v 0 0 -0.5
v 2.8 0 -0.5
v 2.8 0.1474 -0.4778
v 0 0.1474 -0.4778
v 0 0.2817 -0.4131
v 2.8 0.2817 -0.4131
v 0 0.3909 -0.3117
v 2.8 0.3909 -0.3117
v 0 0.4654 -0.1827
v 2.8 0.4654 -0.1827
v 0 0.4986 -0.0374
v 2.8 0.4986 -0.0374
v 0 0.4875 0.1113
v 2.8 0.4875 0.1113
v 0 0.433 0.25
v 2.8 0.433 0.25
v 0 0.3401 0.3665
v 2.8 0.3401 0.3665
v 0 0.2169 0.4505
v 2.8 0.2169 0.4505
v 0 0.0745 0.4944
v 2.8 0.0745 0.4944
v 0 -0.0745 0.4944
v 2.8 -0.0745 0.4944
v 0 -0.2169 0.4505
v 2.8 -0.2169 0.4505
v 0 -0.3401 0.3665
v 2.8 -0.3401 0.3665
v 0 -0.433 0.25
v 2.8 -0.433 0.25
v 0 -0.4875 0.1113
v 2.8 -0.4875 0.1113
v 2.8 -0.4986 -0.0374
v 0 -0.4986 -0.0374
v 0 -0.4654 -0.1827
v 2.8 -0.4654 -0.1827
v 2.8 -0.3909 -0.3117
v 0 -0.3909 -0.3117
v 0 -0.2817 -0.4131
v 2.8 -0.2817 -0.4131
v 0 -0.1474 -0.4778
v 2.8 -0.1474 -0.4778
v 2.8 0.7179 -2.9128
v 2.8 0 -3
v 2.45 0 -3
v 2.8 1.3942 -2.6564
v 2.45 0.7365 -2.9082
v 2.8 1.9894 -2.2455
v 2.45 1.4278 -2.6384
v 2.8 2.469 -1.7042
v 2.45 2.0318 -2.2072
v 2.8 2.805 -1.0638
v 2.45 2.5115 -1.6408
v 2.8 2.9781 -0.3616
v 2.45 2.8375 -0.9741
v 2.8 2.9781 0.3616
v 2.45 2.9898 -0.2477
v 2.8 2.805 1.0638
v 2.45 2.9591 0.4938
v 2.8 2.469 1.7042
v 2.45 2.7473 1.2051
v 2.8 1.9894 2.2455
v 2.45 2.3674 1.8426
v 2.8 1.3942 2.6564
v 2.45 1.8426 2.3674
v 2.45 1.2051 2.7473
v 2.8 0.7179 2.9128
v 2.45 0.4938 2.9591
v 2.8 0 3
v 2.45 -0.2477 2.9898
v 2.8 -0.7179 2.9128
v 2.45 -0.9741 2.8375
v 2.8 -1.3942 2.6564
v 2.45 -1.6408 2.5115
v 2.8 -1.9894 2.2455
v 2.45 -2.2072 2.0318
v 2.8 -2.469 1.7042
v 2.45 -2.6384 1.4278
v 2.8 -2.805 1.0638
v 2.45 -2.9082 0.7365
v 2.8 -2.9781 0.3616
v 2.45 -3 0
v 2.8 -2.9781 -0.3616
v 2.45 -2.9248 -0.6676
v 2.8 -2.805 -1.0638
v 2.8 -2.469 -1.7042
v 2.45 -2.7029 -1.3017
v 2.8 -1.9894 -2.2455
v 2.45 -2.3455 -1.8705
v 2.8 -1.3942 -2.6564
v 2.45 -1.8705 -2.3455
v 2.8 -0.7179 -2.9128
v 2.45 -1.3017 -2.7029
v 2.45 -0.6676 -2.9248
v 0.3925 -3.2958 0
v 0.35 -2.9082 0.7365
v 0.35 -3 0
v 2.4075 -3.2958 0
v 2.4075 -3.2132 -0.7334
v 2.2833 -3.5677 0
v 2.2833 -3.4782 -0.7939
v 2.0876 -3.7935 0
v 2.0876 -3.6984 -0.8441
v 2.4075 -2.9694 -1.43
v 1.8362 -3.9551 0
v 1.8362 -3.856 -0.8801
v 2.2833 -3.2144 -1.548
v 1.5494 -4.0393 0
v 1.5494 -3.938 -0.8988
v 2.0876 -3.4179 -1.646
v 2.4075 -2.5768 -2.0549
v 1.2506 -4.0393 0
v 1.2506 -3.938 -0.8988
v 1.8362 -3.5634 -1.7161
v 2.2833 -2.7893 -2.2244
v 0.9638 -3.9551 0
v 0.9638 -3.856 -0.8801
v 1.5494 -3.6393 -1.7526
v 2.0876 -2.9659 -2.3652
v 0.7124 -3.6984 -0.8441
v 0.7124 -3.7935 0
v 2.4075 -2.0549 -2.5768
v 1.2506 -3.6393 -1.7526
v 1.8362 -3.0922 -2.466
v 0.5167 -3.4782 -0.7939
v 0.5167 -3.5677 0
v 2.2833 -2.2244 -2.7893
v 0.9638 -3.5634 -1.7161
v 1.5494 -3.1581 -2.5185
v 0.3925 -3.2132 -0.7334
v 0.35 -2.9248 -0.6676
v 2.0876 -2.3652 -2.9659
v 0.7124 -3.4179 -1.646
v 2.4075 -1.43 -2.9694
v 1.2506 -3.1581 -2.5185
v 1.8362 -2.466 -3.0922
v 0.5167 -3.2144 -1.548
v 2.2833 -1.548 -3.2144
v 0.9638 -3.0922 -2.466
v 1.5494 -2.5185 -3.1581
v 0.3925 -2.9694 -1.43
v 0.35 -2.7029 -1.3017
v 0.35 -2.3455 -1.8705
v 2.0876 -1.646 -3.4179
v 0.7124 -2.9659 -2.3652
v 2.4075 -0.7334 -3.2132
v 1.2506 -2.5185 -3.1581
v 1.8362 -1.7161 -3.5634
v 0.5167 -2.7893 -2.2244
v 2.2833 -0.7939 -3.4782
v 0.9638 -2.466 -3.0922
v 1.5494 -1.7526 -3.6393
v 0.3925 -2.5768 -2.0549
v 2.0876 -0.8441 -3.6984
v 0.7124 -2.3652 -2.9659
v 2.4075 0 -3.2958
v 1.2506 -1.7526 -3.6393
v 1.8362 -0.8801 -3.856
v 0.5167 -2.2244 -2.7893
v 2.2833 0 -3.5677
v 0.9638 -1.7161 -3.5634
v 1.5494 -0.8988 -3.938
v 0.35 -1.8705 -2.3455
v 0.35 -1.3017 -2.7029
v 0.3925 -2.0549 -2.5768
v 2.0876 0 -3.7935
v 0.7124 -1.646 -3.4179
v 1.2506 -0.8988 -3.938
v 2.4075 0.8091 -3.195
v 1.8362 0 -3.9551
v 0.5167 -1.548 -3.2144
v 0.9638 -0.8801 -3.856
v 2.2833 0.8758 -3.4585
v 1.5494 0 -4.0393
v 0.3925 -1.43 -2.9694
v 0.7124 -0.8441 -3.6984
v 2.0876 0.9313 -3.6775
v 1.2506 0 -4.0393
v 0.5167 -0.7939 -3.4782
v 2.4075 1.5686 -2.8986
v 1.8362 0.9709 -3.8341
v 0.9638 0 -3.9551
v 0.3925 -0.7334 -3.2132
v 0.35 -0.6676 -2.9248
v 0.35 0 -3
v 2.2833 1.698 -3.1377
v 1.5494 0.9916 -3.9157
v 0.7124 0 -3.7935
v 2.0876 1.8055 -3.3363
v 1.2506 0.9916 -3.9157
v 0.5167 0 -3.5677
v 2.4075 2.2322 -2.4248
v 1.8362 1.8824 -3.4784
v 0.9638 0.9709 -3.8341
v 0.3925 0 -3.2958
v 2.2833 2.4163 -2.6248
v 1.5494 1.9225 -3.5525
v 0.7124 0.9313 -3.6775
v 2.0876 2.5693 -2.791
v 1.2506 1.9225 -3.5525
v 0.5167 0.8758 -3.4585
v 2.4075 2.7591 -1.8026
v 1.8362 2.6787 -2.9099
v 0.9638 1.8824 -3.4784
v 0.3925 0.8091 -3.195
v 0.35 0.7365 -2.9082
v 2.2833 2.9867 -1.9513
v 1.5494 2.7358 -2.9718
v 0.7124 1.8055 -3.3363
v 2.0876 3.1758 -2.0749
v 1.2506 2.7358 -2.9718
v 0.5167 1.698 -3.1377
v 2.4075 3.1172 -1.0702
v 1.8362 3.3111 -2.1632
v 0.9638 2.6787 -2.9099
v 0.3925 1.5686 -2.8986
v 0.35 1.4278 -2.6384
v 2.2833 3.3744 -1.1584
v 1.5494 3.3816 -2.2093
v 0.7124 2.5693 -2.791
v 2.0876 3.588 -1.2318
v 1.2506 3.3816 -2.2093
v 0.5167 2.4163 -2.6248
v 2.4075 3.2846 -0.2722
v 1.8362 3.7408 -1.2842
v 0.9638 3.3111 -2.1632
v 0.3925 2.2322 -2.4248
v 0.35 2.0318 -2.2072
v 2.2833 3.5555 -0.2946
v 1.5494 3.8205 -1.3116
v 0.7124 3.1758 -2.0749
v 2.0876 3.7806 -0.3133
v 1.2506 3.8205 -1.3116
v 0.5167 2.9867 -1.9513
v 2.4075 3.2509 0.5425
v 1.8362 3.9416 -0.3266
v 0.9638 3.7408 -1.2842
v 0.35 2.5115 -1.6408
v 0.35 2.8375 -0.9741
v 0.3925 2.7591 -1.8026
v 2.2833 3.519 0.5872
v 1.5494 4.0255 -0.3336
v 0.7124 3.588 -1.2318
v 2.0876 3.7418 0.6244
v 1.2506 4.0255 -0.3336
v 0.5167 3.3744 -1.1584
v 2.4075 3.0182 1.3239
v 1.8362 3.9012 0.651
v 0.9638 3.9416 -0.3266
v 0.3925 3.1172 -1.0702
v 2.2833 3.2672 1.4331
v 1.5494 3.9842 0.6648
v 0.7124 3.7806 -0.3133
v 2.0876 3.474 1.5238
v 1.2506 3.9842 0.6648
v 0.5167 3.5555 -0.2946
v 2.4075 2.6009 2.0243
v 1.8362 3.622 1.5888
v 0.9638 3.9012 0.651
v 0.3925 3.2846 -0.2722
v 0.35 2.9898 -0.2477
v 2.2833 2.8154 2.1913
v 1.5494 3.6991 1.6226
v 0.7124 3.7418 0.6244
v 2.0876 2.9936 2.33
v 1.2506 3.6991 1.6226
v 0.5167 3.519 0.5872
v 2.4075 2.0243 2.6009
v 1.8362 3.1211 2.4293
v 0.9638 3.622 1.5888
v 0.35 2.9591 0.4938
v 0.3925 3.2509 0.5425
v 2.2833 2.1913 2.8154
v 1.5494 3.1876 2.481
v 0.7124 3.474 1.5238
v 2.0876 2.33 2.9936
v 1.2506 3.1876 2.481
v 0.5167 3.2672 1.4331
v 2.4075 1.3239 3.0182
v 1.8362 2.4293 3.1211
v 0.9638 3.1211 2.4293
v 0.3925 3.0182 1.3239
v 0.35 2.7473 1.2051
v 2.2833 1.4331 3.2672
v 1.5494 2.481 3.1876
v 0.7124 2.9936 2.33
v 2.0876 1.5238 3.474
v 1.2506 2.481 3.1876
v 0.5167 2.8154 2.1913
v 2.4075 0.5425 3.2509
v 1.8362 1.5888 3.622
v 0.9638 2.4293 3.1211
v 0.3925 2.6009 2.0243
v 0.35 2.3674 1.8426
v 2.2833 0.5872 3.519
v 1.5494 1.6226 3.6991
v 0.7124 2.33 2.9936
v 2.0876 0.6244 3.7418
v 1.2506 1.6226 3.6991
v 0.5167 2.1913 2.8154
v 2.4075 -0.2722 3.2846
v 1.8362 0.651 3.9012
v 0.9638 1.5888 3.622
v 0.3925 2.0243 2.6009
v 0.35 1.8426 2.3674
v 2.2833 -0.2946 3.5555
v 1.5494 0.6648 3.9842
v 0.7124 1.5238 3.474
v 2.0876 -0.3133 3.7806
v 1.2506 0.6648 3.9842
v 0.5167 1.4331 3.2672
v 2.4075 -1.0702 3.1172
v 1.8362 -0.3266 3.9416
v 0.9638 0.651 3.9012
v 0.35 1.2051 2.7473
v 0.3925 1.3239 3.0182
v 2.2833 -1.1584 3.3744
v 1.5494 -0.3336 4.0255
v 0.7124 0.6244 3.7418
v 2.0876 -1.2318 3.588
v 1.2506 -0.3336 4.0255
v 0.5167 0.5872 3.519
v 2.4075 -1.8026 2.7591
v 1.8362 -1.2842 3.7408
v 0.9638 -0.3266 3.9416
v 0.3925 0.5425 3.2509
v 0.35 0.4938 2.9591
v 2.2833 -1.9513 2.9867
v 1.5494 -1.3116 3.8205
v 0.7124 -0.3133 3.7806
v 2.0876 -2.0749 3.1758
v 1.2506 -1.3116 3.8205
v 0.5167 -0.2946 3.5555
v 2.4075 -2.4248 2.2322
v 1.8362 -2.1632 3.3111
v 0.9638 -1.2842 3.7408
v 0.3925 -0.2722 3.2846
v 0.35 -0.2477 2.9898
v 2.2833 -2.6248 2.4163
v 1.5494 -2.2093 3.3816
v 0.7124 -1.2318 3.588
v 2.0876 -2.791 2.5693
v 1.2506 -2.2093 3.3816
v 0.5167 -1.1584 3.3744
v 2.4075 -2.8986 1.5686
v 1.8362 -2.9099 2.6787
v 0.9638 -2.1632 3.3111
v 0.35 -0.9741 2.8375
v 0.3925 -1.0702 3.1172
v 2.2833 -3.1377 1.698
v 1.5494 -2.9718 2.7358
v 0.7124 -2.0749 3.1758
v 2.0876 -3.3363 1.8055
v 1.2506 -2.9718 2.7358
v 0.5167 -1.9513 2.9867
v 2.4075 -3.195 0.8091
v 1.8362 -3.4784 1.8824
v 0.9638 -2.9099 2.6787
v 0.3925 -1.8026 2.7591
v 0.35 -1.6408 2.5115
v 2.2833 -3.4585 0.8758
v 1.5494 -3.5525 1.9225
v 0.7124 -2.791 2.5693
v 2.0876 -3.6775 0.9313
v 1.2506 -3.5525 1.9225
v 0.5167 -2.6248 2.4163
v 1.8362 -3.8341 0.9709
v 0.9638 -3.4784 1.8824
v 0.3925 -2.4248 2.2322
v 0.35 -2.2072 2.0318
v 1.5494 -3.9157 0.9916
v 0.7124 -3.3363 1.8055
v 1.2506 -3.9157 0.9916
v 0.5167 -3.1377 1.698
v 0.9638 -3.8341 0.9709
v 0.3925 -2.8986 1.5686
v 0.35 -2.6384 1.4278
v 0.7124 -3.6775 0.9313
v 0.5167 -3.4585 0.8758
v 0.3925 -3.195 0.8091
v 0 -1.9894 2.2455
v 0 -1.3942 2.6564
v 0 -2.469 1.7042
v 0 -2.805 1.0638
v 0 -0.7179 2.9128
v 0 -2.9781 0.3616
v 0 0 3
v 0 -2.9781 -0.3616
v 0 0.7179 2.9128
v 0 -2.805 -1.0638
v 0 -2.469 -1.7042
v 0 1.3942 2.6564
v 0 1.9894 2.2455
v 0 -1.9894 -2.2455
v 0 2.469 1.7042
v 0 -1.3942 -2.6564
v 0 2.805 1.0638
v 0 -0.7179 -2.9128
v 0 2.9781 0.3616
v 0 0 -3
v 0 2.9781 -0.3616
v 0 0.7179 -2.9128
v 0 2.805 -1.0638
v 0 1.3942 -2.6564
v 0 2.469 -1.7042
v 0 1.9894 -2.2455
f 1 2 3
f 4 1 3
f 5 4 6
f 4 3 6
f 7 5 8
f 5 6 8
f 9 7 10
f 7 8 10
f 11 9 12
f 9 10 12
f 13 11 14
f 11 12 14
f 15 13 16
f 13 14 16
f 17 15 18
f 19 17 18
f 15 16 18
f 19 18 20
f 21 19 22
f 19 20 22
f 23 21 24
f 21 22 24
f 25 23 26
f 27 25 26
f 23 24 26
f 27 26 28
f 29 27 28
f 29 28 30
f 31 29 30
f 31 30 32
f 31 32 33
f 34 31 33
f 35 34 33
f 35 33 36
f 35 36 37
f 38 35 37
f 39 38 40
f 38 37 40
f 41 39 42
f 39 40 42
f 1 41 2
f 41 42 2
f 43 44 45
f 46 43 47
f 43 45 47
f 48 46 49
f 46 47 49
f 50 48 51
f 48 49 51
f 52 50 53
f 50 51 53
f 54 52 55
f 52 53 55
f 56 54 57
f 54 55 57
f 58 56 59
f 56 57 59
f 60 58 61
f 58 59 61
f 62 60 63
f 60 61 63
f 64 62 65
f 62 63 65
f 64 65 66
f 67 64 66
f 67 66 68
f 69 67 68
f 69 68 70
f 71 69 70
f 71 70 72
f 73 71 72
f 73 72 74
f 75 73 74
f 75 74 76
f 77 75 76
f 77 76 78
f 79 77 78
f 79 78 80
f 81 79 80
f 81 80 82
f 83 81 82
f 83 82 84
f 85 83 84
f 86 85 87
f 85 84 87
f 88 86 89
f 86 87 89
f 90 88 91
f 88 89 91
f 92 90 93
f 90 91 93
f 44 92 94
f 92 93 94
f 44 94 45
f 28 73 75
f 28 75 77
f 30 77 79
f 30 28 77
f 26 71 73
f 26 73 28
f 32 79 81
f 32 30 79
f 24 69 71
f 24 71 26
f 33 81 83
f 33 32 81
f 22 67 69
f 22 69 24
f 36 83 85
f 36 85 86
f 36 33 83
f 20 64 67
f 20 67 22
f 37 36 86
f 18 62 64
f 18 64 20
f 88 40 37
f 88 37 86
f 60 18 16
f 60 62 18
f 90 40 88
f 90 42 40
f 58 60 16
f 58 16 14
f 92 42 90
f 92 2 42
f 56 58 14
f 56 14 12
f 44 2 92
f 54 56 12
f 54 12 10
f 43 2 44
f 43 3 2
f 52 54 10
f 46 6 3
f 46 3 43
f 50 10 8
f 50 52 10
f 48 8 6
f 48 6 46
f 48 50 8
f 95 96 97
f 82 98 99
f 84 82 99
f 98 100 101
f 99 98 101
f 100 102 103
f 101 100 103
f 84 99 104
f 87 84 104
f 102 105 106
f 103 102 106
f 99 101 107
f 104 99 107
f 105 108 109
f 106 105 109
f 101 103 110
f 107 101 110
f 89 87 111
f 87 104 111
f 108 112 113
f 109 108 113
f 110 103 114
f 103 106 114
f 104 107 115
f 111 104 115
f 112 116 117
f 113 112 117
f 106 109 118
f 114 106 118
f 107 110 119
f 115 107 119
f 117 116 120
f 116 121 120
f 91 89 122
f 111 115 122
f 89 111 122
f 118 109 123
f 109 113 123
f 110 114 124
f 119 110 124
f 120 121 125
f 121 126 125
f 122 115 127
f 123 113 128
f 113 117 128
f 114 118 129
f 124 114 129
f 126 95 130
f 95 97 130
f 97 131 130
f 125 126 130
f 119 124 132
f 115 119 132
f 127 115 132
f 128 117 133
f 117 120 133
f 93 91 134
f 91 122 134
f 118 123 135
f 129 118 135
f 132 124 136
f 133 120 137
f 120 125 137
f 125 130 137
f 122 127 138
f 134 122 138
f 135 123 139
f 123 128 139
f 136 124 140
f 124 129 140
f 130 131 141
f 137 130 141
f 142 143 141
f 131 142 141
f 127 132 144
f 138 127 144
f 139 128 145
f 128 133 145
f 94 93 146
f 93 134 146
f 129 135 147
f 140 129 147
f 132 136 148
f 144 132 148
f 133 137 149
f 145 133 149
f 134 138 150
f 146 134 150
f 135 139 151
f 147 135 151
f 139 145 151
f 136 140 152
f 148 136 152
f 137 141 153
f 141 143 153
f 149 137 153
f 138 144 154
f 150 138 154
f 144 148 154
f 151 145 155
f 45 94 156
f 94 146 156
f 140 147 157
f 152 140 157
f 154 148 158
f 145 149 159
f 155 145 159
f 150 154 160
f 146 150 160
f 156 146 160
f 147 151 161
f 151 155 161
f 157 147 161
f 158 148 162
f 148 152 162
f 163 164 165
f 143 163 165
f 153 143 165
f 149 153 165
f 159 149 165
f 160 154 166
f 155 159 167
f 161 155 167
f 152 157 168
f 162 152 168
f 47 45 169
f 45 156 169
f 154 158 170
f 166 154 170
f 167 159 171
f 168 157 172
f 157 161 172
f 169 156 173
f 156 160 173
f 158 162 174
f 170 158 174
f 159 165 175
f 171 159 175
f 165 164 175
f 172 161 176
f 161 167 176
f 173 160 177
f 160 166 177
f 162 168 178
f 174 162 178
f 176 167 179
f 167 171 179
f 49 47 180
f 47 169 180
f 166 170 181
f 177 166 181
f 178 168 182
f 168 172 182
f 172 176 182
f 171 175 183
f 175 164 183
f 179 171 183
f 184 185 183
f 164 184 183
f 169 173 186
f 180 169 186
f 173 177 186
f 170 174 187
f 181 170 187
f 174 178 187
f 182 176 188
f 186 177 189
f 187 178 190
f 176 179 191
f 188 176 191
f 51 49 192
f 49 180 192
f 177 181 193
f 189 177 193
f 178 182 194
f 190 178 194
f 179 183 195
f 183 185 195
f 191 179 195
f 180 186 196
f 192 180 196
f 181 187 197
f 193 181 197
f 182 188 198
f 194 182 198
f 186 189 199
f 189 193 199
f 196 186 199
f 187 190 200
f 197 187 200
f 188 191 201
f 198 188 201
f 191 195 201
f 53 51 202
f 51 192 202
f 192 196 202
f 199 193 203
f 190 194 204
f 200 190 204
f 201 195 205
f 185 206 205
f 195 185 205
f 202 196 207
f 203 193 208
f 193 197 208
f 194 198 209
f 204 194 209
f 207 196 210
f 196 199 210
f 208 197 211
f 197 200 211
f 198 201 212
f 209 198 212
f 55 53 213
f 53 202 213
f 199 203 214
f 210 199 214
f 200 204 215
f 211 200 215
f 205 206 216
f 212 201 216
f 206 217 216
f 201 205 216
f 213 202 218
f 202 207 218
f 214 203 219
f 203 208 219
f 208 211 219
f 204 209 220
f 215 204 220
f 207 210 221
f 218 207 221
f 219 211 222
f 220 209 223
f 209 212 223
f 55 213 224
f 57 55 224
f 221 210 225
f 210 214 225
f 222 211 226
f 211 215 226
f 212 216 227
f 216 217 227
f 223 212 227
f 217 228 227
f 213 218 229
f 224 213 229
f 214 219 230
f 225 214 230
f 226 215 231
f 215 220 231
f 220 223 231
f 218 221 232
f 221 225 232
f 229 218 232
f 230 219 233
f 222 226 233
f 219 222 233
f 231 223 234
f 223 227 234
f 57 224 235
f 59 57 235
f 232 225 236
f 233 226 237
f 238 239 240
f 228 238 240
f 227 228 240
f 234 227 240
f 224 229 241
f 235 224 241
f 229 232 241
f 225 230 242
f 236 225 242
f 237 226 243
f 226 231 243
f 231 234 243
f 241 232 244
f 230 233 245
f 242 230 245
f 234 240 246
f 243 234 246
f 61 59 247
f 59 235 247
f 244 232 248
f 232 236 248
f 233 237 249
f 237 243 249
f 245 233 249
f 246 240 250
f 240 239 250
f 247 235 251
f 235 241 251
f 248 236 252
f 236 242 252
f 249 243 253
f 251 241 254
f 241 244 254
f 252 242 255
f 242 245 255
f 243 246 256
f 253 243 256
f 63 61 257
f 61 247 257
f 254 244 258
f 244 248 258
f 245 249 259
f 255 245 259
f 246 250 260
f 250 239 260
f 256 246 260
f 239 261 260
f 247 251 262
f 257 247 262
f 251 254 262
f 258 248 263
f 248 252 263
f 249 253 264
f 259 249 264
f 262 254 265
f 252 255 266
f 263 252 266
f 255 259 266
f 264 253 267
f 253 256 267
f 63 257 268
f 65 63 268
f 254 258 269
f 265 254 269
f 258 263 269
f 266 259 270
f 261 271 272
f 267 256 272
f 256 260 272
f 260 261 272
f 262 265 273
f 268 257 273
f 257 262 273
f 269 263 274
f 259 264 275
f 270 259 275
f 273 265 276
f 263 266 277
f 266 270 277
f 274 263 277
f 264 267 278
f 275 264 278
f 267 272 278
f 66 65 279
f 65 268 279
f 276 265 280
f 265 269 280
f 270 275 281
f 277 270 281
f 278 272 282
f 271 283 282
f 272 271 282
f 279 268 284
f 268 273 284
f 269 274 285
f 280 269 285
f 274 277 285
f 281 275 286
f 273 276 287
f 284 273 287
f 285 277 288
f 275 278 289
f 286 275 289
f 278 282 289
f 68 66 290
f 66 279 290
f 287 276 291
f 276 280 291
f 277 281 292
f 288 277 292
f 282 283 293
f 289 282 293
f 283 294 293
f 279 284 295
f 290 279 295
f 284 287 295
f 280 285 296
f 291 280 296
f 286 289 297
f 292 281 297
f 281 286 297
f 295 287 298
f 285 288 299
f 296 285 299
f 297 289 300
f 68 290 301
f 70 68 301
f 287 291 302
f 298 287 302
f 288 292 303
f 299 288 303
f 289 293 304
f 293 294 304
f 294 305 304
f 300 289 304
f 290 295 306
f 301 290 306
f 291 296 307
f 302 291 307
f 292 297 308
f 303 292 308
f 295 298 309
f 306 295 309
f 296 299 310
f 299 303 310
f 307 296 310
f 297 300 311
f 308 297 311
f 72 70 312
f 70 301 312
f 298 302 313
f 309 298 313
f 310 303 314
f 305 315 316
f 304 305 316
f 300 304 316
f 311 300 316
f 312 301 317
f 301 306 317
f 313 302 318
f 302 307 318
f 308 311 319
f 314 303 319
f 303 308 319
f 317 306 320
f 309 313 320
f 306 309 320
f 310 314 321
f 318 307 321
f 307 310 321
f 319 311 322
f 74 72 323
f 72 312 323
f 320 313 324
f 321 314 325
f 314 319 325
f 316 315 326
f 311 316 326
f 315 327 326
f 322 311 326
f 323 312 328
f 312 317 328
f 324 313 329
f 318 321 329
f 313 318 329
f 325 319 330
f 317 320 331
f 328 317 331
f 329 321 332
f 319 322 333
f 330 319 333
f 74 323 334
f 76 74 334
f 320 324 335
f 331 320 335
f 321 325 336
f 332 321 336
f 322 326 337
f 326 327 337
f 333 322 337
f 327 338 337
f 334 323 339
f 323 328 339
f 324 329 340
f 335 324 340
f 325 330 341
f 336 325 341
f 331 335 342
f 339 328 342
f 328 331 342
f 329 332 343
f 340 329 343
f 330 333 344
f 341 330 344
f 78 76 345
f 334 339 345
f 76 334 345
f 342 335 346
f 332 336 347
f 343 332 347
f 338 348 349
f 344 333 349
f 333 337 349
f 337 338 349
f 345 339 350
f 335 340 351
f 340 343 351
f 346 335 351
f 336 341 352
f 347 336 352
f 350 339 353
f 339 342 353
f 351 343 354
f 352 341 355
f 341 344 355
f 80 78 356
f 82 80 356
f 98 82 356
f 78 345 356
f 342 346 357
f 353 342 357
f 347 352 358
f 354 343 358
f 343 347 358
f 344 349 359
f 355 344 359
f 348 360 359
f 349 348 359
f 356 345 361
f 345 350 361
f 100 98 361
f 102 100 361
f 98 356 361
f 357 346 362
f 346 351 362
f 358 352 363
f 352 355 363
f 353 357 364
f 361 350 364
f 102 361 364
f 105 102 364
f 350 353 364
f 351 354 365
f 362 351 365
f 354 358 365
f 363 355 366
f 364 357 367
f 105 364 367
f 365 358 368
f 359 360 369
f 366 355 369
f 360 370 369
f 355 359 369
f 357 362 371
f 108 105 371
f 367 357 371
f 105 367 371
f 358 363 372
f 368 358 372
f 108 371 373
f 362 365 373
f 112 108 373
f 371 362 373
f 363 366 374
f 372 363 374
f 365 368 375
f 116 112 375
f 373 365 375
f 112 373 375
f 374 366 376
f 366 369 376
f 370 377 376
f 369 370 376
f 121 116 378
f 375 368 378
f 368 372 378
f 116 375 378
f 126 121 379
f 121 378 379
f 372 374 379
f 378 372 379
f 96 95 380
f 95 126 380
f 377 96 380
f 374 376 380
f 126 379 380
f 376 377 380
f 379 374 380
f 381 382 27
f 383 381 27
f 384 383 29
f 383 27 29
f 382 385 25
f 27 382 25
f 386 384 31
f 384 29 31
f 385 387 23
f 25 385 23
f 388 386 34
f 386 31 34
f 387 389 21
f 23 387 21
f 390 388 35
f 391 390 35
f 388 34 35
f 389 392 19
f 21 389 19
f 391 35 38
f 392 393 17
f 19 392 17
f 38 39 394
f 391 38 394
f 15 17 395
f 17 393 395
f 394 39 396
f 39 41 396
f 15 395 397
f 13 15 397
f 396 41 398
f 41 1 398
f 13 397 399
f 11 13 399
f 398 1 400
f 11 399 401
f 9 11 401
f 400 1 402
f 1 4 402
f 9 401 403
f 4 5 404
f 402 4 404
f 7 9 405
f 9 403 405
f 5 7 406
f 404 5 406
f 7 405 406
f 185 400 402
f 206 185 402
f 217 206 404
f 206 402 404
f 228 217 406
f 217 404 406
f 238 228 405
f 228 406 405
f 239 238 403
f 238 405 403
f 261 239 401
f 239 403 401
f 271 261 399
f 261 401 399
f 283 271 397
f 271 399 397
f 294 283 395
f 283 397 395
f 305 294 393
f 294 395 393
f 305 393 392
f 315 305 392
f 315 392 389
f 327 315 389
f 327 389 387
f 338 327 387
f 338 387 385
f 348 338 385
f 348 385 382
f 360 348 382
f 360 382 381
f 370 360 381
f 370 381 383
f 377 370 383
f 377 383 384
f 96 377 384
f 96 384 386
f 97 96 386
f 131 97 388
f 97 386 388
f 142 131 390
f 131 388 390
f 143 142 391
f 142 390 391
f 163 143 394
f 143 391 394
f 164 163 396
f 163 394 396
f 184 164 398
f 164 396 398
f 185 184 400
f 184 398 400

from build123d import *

# Parameters (mm, degrees)
SKETCH1_R           = 3
BOSS_EXTRUDE1_DEPTH = 2.8
SKETCH4_R           = 1.05
SKETCH5_R           = 0.5
CUT_EXTRUDE1_DEPTH  = 2.8


with BuildPart() as part:
    # Sketch1 → Boss-Extrude1 (new body)
    with BuildSketch(Plane(origin=(0, 0, 0), x_dir=(0, 0, -1), z_dir=(1, 0, 0))):
        Circle(SKETCH1_R)
    extrude(amount=BOSS_EXTRUDE1_DEPTH)

    # Sketch4 → Revolve1 (revolve)
    with BuildSketch(Plane.XY, mode=Mode.PRIVATE) as revolve1_sk:
        with Locations((1.4, 3)):
            Circle(SKETCH4_R)
    revolve(revolve1_sk.sketch.rotate(Axis((0, 0, 0), (1, 0, 0)), 180), axis=Axis((0, 0, 0), (1, 0, 0)))

    # Sketch5 → Cut-Extrude1 (cut)
    with BuildSketch(Plane(origin=(2.8, 0, 0), x_dir=(0, 0, -1), z_dir=(1, 0, 0))):
        Circle(SKETCH5_R)
    extrude(amount=-CUT_EXTRUDE1_DEPTH, mode=Mode.SUBTRACT)


solid = part.part
